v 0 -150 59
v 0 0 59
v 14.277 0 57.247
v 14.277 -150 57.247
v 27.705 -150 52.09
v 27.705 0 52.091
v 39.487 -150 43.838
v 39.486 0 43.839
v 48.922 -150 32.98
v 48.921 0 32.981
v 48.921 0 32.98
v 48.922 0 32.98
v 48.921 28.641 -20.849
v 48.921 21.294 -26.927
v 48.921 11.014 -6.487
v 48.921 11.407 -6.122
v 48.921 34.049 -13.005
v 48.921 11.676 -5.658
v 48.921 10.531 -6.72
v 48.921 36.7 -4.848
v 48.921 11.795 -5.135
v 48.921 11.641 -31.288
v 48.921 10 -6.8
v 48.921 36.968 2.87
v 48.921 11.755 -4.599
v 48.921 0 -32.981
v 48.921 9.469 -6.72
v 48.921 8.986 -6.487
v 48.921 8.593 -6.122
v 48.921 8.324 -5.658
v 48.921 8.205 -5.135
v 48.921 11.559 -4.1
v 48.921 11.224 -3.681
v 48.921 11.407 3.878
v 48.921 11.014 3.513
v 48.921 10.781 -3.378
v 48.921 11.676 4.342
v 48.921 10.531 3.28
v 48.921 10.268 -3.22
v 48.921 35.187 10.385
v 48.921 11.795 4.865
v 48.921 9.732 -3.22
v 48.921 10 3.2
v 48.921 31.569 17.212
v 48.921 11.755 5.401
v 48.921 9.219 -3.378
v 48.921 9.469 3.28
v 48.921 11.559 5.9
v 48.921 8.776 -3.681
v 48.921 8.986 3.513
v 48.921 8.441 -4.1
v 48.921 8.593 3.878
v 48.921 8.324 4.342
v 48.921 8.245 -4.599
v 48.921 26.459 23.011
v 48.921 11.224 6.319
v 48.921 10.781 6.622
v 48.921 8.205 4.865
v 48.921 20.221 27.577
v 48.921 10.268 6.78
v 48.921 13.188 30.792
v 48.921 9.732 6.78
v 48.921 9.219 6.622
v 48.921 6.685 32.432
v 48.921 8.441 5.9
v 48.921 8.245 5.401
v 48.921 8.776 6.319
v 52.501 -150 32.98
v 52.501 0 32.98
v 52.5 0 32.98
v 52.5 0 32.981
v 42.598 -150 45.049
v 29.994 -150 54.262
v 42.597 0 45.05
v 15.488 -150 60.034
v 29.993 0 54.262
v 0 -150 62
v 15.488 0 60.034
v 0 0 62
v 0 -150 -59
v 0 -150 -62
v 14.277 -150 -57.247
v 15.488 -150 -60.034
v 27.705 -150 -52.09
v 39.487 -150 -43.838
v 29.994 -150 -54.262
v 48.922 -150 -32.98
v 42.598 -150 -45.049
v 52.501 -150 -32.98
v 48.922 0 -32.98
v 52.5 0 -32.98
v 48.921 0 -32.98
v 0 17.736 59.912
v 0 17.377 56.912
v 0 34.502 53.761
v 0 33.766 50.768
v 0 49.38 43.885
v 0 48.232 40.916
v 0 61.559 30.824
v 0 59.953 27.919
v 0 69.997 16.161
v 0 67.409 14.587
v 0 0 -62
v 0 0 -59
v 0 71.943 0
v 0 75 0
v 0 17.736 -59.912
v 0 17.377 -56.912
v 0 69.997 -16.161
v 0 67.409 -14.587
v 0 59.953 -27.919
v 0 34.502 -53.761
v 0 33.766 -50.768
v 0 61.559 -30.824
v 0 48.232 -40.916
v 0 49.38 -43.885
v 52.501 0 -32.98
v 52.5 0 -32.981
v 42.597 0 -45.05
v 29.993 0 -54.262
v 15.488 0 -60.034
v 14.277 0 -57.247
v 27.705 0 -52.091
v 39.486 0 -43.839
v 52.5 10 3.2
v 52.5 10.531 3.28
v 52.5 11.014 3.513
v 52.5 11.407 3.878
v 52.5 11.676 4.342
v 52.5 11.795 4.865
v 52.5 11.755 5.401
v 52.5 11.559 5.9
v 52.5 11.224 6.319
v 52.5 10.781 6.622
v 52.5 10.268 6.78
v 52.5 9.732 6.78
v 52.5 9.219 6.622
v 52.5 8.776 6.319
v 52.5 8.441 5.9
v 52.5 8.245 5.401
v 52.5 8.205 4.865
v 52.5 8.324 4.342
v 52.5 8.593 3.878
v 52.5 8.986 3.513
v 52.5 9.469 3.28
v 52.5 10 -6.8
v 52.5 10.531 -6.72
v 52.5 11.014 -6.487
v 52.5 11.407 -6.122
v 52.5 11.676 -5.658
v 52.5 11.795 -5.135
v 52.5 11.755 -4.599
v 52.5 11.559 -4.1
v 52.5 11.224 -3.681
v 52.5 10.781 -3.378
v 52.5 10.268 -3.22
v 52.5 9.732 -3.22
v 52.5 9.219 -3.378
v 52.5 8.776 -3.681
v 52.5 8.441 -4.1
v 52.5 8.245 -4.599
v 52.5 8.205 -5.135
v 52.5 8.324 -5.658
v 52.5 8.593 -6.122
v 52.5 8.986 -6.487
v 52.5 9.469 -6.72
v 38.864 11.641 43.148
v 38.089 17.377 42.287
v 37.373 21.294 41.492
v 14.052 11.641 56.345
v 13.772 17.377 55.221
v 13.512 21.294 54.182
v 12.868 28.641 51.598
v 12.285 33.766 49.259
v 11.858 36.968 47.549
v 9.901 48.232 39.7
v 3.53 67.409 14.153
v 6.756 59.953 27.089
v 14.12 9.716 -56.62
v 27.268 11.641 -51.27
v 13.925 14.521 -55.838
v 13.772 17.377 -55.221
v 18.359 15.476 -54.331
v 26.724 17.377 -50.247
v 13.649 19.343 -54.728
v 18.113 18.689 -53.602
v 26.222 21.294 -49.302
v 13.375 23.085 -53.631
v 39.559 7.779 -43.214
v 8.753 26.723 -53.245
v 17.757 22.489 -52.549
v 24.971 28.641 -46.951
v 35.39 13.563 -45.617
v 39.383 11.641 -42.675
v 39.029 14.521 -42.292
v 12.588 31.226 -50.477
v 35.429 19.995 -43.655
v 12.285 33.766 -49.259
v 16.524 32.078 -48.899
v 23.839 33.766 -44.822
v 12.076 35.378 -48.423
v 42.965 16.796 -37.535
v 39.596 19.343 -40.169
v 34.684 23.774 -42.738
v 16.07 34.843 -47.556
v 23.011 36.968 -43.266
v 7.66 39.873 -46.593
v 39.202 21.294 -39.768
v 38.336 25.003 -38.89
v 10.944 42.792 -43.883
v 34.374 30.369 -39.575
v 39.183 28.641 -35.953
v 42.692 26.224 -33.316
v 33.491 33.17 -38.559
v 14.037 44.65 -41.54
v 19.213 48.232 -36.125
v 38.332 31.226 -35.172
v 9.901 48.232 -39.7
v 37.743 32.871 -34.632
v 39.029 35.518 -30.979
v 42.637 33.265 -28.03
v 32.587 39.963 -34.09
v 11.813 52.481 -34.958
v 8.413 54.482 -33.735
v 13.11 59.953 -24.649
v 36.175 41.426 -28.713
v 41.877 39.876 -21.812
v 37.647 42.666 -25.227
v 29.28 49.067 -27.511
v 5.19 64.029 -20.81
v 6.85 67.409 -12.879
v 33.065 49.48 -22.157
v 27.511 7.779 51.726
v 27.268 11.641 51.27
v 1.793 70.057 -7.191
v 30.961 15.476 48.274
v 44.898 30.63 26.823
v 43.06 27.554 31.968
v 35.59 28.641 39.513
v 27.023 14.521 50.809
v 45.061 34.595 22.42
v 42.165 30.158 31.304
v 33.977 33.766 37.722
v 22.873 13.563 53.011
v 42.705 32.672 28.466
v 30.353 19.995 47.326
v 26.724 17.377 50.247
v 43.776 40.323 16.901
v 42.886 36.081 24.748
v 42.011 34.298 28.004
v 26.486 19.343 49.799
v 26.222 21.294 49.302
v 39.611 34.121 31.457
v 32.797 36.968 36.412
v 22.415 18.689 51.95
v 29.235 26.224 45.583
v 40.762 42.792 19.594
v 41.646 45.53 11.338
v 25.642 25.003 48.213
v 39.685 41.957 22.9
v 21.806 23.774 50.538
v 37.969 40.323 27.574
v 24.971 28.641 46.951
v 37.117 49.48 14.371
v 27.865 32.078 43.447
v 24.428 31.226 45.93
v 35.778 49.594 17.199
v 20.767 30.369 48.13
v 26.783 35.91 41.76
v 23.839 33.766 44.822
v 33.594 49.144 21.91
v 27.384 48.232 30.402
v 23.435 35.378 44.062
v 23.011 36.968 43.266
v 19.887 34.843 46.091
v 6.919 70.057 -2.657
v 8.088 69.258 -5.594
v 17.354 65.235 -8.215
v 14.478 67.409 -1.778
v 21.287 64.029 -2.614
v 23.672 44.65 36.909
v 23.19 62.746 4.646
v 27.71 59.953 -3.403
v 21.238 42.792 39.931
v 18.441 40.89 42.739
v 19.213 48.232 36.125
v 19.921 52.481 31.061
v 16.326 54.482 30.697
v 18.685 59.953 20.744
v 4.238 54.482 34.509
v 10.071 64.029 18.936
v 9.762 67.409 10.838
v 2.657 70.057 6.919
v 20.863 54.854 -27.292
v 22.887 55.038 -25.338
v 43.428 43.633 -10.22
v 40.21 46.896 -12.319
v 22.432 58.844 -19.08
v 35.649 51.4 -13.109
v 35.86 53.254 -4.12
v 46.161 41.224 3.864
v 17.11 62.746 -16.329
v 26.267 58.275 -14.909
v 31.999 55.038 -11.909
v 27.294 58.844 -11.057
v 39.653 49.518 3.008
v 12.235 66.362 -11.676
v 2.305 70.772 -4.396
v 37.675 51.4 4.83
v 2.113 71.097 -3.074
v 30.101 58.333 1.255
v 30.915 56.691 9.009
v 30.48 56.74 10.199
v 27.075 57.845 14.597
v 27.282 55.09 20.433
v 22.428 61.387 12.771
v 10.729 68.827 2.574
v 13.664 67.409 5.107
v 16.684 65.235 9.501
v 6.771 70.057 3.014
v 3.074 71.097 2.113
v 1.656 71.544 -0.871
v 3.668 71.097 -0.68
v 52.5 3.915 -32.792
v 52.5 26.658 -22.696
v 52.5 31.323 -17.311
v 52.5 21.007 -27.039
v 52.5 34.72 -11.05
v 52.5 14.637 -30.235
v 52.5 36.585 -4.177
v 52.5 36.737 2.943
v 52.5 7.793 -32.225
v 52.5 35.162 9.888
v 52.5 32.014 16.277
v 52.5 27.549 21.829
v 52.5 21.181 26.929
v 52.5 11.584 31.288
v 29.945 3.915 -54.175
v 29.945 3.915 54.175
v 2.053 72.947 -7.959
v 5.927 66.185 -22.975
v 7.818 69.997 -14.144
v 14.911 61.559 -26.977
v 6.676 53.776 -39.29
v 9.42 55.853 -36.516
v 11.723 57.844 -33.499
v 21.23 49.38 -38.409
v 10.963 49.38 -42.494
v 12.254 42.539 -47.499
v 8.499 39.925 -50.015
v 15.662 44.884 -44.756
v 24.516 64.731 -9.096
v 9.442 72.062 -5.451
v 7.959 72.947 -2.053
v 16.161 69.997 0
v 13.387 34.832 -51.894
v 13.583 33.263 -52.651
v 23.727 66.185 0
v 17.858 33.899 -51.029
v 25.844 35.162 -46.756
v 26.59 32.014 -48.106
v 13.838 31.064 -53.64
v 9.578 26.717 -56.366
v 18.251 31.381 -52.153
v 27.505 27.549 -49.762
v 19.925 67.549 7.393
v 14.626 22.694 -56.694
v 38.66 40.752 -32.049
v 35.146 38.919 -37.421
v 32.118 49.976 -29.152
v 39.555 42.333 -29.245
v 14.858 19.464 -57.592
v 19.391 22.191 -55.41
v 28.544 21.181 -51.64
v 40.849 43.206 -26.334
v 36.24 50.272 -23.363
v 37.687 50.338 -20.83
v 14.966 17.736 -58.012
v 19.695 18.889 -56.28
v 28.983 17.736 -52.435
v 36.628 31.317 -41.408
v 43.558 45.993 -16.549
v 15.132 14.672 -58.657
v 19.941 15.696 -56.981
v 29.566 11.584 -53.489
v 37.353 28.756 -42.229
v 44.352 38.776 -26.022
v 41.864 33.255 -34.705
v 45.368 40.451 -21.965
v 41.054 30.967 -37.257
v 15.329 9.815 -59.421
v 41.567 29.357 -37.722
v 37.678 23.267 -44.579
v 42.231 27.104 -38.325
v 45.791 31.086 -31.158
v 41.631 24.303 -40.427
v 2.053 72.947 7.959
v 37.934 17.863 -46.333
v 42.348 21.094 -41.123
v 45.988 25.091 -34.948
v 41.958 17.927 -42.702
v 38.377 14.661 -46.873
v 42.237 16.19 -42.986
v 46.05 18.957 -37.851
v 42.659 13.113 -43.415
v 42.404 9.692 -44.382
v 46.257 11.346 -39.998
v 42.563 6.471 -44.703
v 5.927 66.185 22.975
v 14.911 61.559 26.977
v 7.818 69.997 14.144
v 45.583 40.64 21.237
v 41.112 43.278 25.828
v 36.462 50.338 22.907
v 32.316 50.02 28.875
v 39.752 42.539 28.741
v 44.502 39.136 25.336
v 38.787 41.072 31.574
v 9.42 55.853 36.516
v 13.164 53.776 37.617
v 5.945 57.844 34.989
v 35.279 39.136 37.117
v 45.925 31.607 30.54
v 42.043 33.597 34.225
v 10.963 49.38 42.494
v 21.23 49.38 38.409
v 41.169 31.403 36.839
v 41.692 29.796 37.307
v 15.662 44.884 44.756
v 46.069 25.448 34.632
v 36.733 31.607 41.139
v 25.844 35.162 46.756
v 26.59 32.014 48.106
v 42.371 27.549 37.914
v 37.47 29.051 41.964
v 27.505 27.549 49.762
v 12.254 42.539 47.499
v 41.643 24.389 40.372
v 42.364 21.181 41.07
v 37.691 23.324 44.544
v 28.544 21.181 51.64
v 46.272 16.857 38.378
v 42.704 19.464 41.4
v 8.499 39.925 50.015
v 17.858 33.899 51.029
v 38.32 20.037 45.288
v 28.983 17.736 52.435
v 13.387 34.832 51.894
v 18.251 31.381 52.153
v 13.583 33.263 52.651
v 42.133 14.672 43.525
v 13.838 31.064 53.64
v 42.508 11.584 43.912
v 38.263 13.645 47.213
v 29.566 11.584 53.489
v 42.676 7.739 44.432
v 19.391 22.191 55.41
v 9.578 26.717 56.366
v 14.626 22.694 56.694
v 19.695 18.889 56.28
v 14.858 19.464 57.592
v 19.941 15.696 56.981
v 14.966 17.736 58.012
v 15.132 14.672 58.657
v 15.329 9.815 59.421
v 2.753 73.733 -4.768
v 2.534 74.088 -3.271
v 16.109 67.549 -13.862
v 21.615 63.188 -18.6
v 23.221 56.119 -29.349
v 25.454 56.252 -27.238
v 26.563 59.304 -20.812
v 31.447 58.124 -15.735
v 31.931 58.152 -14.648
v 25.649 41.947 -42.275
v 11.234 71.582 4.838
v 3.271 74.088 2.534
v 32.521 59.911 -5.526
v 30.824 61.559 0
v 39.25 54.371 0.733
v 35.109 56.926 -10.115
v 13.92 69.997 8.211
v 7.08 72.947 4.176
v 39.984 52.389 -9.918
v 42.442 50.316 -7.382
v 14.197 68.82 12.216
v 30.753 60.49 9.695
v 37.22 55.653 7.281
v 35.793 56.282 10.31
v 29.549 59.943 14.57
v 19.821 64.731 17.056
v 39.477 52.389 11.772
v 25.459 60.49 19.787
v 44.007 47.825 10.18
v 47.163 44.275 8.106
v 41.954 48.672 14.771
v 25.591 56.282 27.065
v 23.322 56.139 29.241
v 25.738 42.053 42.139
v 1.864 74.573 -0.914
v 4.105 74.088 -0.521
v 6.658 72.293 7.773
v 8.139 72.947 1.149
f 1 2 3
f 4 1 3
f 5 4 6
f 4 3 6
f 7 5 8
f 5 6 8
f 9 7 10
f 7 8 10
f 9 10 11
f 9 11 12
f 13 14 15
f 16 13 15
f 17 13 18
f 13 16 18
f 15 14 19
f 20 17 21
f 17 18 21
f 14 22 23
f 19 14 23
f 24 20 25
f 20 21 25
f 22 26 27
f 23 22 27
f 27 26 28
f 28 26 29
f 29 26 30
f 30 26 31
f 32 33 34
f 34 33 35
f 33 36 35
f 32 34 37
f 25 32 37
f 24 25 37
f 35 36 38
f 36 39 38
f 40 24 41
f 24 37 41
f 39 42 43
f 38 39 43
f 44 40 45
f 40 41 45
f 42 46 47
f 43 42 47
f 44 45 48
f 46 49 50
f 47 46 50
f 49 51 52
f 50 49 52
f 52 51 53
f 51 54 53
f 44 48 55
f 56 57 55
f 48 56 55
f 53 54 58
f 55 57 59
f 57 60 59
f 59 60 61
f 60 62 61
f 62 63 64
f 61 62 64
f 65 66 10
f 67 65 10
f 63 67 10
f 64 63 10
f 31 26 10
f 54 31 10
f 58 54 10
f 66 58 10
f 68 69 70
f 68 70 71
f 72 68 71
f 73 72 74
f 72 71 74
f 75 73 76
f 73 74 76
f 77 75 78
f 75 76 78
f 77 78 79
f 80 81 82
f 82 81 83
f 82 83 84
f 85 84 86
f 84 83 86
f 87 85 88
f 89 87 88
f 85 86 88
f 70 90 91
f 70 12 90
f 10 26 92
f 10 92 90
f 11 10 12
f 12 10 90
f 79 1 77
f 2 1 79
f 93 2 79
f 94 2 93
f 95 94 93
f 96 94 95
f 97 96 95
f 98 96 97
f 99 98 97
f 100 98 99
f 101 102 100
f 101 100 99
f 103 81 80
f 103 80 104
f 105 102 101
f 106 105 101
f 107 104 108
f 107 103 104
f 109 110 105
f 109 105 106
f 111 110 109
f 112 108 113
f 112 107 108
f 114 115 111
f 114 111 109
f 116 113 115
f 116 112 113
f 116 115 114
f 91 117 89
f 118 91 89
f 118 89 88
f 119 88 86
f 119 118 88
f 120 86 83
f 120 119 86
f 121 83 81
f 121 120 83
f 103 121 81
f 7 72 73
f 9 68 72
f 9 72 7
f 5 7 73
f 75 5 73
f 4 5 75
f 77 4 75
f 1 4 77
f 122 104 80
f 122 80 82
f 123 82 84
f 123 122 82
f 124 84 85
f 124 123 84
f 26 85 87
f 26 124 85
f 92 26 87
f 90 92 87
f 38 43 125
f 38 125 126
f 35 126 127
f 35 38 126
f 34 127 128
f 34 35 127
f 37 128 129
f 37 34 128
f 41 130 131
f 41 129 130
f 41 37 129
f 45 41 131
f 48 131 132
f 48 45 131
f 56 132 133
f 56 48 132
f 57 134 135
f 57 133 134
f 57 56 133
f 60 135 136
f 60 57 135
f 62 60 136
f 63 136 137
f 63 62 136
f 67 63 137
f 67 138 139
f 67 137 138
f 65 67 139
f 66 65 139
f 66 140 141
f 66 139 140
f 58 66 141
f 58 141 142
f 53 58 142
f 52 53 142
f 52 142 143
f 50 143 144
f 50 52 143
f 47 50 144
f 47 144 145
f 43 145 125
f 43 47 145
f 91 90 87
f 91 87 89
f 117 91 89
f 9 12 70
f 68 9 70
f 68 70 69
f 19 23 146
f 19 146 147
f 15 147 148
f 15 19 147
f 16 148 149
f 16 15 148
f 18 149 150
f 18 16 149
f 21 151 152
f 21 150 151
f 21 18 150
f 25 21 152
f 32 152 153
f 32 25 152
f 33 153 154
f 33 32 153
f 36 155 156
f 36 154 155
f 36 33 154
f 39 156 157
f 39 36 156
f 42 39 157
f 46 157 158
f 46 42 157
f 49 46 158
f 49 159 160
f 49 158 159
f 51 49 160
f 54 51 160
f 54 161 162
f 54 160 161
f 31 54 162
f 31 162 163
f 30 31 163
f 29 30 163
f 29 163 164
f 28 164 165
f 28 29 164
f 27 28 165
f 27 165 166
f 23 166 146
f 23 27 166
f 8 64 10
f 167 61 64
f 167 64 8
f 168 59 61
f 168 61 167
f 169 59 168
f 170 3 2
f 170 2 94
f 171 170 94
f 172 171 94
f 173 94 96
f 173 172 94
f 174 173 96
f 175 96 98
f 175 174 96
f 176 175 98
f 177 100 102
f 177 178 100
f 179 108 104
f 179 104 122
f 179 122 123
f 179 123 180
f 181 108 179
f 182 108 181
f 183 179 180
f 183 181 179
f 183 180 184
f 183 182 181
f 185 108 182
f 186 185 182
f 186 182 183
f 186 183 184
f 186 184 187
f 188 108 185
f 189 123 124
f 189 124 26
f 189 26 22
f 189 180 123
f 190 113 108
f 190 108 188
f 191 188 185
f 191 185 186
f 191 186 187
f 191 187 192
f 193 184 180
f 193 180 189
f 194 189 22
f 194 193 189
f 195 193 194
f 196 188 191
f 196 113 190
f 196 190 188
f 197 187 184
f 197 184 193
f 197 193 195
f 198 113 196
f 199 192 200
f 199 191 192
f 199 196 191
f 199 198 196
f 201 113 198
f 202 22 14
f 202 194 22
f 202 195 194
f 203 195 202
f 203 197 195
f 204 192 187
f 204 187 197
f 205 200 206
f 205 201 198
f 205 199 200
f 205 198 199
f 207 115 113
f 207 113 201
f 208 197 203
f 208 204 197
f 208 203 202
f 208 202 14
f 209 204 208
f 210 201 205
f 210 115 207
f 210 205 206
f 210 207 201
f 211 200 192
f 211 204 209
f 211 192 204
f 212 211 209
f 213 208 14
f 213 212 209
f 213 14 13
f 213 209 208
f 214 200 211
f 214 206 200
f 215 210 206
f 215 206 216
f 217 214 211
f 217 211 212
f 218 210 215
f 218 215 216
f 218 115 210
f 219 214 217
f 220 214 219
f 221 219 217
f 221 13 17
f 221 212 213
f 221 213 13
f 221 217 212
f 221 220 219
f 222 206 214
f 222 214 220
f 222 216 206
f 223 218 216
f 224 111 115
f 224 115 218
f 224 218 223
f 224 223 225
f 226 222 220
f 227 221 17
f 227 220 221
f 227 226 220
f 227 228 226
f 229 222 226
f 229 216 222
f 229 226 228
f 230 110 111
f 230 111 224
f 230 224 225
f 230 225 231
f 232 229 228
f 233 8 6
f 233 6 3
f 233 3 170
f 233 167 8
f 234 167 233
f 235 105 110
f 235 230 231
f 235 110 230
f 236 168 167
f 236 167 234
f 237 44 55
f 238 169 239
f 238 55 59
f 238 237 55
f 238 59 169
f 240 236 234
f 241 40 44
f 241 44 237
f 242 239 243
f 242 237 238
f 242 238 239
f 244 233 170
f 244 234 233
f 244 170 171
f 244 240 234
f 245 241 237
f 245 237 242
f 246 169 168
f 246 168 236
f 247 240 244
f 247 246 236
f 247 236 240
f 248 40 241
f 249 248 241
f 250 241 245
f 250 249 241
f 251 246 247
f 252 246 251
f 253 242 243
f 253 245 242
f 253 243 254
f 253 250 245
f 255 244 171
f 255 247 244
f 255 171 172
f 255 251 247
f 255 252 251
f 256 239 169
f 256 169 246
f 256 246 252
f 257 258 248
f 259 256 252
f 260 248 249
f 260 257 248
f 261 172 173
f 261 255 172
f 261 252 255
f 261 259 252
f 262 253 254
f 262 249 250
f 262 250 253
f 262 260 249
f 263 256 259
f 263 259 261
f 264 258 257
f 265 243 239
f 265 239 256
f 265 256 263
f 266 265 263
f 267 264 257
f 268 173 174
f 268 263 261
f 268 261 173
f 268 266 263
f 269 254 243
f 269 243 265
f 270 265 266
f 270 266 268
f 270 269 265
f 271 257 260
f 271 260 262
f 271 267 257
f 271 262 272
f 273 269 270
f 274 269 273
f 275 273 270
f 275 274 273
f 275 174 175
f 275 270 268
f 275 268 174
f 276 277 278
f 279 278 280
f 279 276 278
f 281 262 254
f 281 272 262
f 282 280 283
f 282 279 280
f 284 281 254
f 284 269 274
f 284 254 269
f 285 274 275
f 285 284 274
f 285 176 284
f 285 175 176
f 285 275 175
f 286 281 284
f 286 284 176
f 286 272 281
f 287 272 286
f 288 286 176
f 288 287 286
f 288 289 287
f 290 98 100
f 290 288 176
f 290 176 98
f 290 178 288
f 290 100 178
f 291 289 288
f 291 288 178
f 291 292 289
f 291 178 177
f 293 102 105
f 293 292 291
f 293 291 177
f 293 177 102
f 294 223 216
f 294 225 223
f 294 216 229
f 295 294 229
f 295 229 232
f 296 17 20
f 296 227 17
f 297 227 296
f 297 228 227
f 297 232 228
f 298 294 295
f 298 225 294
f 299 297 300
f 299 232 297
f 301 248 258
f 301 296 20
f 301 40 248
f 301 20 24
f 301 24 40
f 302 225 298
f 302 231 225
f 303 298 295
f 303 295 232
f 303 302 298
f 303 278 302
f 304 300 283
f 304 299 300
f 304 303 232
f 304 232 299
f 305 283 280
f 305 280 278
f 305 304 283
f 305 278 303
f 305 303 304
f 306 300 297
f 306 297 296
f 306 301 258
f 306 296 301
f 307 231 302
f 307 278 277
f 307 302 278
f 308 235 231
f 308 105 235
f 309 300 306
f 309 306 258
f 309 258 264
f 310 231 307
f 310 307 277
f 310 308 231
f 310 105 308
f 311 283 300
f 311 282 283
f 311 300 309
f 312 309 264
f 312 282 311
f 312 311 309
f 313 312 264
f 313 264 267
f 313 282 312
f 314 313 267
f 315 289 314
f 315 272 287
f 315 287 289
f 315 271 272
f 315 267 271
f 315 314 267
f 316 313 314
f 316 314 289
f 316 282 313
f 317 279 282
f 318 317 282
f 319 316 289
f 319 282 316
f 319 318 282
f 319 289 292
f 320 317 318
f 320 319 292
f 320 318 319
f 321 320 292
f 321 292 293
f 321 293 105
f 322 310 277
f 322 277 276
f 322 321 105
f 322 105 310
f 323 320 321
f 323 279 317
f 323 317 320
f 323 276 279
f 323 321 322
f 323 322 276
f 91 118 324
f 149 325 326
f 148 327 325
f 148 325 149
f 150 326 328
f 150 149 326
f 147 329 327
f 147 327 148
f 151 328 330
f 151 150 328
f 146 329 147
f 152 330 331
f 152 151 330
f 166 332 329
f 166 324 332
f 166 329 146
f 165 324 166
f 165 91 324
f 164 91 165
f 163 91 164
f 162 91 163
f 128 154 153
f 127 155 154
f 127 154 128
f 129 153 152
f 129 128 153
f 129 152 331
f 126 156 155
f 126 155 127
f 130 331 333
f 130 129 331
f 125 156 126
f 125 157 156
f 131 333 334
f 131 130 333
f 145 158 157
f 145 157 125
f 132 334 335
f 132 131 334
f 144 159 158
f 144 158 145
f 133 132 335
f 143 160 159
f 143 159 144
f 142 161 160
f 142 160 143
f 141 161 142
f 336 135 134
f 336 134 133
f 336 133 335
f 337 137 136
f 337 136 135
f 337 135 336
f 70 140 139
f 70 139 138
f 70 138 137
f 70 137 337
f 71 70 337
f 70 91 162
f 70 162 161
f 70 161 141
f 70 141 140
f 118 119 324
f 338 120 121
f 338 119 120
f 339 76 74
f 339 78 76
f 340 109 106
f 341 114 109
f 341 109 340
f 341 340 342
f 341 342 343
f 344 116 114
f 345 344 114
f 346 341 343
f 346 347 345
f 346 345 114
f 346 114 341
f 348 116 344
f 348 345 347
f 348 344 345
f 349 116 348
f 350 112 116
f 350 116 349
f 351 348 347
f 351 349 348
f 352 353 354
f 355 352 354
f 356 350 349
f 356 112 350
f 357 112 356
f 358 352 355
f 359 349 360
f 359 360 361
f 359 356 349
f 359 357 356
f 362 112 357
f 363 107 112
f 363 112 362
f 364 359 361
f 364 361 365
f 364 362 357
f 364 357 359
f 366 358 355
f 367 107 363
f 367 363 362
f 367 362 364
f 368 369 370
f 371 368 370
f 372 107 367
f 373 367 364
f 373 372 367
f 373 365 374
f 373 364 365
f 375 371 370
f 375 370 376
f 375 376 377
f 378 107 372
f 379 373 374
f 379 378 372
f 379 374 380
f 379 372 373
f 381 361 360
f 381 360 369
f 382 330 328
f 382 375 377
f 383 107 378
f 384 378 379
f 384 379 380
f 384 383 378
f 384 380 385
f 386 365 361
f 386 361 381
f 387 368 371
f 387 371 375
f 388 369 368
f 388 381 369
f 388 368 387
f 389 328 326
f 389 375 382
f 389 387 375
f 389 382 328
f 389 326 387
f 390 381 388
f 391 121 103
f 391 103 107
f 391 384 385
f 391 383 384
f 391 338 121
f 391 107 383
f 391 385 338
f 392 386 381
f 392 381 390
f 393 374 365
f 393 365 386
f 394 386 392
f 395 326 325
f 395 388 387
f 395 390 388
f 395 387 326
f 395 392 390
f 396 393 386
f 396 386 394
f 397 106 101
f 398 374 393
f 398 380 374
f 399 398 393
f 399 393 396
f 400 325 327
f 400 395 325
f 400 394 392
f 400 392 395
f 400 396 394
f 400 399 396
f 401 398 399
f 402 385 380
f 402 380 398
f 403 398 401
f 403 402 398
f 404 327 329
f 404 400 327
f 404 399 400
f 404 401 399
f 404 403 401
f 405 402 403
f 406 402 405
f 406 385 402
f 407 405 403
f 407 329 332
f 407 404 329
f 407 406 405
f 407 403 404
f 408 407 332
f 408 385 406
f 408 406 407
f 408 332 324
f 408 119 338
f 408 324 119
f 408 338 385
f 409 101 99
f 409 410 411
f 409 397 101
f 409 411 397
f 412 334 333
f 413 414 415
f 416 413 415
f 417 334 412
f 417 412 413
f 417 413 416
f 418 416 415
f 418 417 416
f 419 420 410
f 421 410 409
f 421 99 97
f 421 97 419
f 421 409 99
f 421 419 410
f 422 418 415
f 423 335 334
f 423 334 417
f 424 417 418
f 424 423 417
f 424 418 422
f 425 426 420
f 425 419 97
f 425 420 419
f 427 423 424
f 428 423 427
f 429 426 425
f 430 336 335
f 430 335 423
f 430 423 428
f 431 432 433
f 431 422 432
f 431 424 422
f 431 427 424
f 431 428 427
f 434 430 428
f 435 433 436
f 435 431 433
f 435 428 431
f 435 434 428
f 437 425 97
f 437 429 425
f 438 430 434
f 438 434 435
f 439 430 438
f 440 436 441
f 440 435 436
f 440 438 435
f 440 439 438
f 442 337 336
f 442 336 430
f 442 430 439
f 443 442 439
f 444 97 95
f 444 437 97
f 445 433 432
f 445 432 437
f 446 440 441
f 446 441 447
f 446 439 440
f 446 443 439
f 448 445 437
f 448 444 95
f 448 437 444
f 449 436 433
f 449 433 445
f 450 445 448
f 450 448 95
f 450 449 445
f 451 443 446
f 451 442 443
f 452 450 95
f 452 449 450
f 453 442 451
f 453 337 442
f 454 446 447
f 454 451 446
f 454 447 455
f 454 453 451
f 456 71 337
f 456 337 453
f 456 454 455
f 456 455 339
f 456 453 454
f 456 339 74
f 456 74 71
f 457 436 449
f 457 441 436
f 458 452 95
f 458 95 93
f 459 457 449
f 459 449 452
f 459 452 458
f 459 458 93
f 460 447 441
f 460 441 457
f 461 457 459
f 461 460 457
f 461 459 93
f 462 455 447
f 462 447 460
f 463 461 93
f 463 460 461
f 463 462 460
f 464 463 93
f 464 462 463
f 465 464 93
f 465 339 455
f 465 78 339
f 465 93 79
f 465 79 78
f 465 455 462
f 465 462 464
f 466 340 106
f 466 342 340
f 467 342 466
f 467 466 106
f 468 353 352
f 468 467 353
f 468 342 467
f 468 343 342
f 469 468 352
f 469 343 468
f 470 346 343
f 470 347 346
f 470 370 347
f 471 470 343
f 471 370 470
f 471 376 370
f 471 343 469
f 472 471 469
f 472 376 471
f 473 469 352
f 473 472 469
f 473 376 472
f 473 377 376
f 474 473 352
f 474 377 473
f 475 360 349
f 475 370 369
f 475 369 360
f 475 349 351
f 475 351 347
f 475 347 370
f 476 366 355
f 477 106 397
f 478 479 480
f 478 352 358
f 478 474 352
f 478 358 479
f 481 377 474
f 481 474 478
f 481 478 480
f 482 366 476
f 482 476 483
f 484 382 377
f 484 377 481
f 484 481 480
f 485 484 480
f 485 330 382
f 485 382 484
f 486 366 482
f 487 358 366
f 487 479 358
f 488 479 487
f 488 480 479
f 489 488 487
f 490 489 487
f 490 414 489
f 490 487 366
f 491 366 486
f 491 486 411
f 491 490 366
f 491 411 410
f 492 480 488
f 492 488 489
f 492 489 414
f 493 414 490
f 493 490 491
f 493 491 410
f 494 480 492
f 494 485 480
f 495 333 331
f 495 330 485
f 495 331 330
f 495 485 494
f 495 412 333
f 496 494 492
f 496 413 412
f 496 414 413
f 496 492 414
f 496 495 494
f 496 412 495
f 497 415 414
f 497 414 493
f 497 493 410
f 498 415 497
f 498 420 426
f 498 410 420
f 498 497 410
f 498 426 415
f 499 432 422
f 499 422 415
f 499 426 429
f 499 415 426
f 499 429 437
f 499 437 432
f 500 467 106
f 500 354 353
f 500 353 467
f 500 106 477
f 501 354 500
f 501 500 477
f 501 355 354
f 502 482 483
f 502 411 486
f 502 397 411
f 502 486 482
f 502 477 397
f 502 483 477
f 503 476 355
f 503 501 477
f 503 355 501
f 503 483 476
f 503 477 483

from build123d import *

# Parameters (mm, degrees)
SKETCH2_OUTSIDE_W       = 164.146
SKETCH2_OUTSIDE_H       = 164.146
SKETCH2_OUTSIDE_W_2     = 105
SKETCH2_OUTSIDE_H_2     = 145.767420334
CUT_EXTRUDE2_DEPTH      = 116.381974501
BOSS_EXTRUDE2_REACH     = 112.568
SKETCH3_W               = 3.579145551
SKETCH3_H               = 65.962110336
BOSS_EXTRUDE4_DEPTH     = 150
CUT_EXTRUDE3_DEPTH      = 171.58815789
CUT_EXTRUDE3_DEPTH_BACK = 171.58815789
SKETCH5_W               = 112.520122243
SKETCH5_H               = 235.639617785
CUT_EXTRUDE4_DEPTH      = 171.587954009
CUT_EXTRUDE4_DEPTH_BACK = 171.587954009
SKETCH6_R               = 1.8


with BuildPart() as part:
    # Sketch1 → Revolve1 (revolve)
    with BuildSketch(Plane.XY):
        with BuildLine():
            Line((62, 0), (59, 0))
            ThreePointArc((59, 0), (42.363721251, 46.52102369), (0, 71.943189953))
            Line((0, 71.943189953), (0, 75))
            ThreePointArc((0, 75), (44.493217858, 48.65439343), (62, 0))
        make_face()
    revolve(axis=Axis((0, 75, 0), (0, -1, 0)))

    # Sketch2 outside → Cut-Extrude2 (cut, through all)
    with BuildSketch(Plane(origin=(0, 0, 0), x_dir=(-1, 0, 0), z_dir=(0, -1, 0))):
        Rectangle(SKETCH2_OUTSIDE_W, SKETCH2_OUTSIDE_H)
        Rectangle(SKETCH2_OUTSIDE_W_2, SKETCH2_OUTSIDE_H_2, mode=Mode.SUBTRACT)
    extrude(amount=-CUT_EXTRUDE2_DEPTH, mode=Mode.SUBTRACT)

    # Sketch3 → Boss-Extrude2 (add, up to next)
    with BuildSketch(Plane.XZ, mode=Mode.PRIVATE) as boss_extrude2_sk1:
        with Locations((-50.710427225, 0)):
            Rectangle(SKETCH3_W, SKETCH3_H)
    boss_extrude2_tool1 = extrude(boss_extrude2_sk1.sketch, amount=-BOSS_EXTRUDE2_REACH, mode=Mode.PRIVATE) - part.part
    # Sketch3 → Boss-Extrude2 (add, up to next)
    with BuildSketch(Plane.XZ, mode=Mode.PRIVATE) as boss_extrude2_sk2:
        with Locations((50.710427225, 0)):
            Rectangle(SKETCH3_W, SKETCH3_H)
    boss_extrude2_tool2 = extrude(boss_extrude2_sk2.sketch, amount=-BOSS_EXTRUDE2_REACH, mode=Mode.PRIVATE) - part.part
    add(boss_extrude2_tool1.solids().sort_by_distance((-50.710427, 0, 0))[0])
    add(boss_extrude2_tool2.solids().sort_by_distance((50.710427, 0, 0))[0])

    # Sketch4 → Boss-Extrude4 (add)
    with BuildSketch(Plane(origin=(0, 0, 0), x_dir=(-1, 0, 0), z_dir=(0, -1, 0))):
        with BuildLine():
            Line((52.500662853, -32.98), (48.921565797, -32.98))
            ThreePointArc((48.921565797, -32.98), (0, -59), (-48.921565797, -32.98))
            Line((-48.921565797, -32.98), (-52.500662853, -32.98))
            ThreePointArc((-52.500662853, -32.98), (0, -62), (52.500662853, -32.98))
        make_face()
        with BuildLine():
            Line((-48.921565797, 32.98), (-52.500662853, 32.98))
            ThreePointArc((-52.500662853, 32.98), (0, 62), (52.500662853, 32.98))
            Line((52.500662853, 32.98), (48.921565797, 32.98))
            ThreePointArc((48.921565797, 32.98), (0, 59), (-48.921565797, 32.98))
        make_face()
    extrude(amount=BOSS_EXTRUDE4_DEPTH)

    # Sketch5 → Cut-Extrude3 (cut, two sides: drawn at the far end of the back side and taken through both)
    with BuildSketch(Plane.XY.offset(-CUT_EXTRUDE3_DEPTH_BACK)):
        with Locations((-56.260061122, -36.450714171)):
            Rectangle(SKETCH5_W, SKETCH5_H)
    extrude(amount=CUT_EXTRUDE3_DEPTH + CUT_EXTRUDE3_DEPTH_BACK, mode=Mode.SUBTRACT)

    # Sketch6 → Cut-Extrude4 (cut, two sides: drawn at the far end of the back side and taken through both)
    with BuildSketch(Plane(origin=(52.5, 0, 0), x_dir=(0, 0, -1), z_dir=(1, 0, 0)).offset(-CUT_EXTRUDE4_DEPTH_BACK)):
        with Locations((-5, 10)):
            Circle(SKETCH6_R)
        with Locations((5, 10)):
            Circle(SKETCH6_R)
    extrude(amount=CUT_EXTRUDE4_DEPTH + CUT_EXTRUDE4_DEPTH_BACK, mode=Mode.SUBTRACT)


solid = part.part
